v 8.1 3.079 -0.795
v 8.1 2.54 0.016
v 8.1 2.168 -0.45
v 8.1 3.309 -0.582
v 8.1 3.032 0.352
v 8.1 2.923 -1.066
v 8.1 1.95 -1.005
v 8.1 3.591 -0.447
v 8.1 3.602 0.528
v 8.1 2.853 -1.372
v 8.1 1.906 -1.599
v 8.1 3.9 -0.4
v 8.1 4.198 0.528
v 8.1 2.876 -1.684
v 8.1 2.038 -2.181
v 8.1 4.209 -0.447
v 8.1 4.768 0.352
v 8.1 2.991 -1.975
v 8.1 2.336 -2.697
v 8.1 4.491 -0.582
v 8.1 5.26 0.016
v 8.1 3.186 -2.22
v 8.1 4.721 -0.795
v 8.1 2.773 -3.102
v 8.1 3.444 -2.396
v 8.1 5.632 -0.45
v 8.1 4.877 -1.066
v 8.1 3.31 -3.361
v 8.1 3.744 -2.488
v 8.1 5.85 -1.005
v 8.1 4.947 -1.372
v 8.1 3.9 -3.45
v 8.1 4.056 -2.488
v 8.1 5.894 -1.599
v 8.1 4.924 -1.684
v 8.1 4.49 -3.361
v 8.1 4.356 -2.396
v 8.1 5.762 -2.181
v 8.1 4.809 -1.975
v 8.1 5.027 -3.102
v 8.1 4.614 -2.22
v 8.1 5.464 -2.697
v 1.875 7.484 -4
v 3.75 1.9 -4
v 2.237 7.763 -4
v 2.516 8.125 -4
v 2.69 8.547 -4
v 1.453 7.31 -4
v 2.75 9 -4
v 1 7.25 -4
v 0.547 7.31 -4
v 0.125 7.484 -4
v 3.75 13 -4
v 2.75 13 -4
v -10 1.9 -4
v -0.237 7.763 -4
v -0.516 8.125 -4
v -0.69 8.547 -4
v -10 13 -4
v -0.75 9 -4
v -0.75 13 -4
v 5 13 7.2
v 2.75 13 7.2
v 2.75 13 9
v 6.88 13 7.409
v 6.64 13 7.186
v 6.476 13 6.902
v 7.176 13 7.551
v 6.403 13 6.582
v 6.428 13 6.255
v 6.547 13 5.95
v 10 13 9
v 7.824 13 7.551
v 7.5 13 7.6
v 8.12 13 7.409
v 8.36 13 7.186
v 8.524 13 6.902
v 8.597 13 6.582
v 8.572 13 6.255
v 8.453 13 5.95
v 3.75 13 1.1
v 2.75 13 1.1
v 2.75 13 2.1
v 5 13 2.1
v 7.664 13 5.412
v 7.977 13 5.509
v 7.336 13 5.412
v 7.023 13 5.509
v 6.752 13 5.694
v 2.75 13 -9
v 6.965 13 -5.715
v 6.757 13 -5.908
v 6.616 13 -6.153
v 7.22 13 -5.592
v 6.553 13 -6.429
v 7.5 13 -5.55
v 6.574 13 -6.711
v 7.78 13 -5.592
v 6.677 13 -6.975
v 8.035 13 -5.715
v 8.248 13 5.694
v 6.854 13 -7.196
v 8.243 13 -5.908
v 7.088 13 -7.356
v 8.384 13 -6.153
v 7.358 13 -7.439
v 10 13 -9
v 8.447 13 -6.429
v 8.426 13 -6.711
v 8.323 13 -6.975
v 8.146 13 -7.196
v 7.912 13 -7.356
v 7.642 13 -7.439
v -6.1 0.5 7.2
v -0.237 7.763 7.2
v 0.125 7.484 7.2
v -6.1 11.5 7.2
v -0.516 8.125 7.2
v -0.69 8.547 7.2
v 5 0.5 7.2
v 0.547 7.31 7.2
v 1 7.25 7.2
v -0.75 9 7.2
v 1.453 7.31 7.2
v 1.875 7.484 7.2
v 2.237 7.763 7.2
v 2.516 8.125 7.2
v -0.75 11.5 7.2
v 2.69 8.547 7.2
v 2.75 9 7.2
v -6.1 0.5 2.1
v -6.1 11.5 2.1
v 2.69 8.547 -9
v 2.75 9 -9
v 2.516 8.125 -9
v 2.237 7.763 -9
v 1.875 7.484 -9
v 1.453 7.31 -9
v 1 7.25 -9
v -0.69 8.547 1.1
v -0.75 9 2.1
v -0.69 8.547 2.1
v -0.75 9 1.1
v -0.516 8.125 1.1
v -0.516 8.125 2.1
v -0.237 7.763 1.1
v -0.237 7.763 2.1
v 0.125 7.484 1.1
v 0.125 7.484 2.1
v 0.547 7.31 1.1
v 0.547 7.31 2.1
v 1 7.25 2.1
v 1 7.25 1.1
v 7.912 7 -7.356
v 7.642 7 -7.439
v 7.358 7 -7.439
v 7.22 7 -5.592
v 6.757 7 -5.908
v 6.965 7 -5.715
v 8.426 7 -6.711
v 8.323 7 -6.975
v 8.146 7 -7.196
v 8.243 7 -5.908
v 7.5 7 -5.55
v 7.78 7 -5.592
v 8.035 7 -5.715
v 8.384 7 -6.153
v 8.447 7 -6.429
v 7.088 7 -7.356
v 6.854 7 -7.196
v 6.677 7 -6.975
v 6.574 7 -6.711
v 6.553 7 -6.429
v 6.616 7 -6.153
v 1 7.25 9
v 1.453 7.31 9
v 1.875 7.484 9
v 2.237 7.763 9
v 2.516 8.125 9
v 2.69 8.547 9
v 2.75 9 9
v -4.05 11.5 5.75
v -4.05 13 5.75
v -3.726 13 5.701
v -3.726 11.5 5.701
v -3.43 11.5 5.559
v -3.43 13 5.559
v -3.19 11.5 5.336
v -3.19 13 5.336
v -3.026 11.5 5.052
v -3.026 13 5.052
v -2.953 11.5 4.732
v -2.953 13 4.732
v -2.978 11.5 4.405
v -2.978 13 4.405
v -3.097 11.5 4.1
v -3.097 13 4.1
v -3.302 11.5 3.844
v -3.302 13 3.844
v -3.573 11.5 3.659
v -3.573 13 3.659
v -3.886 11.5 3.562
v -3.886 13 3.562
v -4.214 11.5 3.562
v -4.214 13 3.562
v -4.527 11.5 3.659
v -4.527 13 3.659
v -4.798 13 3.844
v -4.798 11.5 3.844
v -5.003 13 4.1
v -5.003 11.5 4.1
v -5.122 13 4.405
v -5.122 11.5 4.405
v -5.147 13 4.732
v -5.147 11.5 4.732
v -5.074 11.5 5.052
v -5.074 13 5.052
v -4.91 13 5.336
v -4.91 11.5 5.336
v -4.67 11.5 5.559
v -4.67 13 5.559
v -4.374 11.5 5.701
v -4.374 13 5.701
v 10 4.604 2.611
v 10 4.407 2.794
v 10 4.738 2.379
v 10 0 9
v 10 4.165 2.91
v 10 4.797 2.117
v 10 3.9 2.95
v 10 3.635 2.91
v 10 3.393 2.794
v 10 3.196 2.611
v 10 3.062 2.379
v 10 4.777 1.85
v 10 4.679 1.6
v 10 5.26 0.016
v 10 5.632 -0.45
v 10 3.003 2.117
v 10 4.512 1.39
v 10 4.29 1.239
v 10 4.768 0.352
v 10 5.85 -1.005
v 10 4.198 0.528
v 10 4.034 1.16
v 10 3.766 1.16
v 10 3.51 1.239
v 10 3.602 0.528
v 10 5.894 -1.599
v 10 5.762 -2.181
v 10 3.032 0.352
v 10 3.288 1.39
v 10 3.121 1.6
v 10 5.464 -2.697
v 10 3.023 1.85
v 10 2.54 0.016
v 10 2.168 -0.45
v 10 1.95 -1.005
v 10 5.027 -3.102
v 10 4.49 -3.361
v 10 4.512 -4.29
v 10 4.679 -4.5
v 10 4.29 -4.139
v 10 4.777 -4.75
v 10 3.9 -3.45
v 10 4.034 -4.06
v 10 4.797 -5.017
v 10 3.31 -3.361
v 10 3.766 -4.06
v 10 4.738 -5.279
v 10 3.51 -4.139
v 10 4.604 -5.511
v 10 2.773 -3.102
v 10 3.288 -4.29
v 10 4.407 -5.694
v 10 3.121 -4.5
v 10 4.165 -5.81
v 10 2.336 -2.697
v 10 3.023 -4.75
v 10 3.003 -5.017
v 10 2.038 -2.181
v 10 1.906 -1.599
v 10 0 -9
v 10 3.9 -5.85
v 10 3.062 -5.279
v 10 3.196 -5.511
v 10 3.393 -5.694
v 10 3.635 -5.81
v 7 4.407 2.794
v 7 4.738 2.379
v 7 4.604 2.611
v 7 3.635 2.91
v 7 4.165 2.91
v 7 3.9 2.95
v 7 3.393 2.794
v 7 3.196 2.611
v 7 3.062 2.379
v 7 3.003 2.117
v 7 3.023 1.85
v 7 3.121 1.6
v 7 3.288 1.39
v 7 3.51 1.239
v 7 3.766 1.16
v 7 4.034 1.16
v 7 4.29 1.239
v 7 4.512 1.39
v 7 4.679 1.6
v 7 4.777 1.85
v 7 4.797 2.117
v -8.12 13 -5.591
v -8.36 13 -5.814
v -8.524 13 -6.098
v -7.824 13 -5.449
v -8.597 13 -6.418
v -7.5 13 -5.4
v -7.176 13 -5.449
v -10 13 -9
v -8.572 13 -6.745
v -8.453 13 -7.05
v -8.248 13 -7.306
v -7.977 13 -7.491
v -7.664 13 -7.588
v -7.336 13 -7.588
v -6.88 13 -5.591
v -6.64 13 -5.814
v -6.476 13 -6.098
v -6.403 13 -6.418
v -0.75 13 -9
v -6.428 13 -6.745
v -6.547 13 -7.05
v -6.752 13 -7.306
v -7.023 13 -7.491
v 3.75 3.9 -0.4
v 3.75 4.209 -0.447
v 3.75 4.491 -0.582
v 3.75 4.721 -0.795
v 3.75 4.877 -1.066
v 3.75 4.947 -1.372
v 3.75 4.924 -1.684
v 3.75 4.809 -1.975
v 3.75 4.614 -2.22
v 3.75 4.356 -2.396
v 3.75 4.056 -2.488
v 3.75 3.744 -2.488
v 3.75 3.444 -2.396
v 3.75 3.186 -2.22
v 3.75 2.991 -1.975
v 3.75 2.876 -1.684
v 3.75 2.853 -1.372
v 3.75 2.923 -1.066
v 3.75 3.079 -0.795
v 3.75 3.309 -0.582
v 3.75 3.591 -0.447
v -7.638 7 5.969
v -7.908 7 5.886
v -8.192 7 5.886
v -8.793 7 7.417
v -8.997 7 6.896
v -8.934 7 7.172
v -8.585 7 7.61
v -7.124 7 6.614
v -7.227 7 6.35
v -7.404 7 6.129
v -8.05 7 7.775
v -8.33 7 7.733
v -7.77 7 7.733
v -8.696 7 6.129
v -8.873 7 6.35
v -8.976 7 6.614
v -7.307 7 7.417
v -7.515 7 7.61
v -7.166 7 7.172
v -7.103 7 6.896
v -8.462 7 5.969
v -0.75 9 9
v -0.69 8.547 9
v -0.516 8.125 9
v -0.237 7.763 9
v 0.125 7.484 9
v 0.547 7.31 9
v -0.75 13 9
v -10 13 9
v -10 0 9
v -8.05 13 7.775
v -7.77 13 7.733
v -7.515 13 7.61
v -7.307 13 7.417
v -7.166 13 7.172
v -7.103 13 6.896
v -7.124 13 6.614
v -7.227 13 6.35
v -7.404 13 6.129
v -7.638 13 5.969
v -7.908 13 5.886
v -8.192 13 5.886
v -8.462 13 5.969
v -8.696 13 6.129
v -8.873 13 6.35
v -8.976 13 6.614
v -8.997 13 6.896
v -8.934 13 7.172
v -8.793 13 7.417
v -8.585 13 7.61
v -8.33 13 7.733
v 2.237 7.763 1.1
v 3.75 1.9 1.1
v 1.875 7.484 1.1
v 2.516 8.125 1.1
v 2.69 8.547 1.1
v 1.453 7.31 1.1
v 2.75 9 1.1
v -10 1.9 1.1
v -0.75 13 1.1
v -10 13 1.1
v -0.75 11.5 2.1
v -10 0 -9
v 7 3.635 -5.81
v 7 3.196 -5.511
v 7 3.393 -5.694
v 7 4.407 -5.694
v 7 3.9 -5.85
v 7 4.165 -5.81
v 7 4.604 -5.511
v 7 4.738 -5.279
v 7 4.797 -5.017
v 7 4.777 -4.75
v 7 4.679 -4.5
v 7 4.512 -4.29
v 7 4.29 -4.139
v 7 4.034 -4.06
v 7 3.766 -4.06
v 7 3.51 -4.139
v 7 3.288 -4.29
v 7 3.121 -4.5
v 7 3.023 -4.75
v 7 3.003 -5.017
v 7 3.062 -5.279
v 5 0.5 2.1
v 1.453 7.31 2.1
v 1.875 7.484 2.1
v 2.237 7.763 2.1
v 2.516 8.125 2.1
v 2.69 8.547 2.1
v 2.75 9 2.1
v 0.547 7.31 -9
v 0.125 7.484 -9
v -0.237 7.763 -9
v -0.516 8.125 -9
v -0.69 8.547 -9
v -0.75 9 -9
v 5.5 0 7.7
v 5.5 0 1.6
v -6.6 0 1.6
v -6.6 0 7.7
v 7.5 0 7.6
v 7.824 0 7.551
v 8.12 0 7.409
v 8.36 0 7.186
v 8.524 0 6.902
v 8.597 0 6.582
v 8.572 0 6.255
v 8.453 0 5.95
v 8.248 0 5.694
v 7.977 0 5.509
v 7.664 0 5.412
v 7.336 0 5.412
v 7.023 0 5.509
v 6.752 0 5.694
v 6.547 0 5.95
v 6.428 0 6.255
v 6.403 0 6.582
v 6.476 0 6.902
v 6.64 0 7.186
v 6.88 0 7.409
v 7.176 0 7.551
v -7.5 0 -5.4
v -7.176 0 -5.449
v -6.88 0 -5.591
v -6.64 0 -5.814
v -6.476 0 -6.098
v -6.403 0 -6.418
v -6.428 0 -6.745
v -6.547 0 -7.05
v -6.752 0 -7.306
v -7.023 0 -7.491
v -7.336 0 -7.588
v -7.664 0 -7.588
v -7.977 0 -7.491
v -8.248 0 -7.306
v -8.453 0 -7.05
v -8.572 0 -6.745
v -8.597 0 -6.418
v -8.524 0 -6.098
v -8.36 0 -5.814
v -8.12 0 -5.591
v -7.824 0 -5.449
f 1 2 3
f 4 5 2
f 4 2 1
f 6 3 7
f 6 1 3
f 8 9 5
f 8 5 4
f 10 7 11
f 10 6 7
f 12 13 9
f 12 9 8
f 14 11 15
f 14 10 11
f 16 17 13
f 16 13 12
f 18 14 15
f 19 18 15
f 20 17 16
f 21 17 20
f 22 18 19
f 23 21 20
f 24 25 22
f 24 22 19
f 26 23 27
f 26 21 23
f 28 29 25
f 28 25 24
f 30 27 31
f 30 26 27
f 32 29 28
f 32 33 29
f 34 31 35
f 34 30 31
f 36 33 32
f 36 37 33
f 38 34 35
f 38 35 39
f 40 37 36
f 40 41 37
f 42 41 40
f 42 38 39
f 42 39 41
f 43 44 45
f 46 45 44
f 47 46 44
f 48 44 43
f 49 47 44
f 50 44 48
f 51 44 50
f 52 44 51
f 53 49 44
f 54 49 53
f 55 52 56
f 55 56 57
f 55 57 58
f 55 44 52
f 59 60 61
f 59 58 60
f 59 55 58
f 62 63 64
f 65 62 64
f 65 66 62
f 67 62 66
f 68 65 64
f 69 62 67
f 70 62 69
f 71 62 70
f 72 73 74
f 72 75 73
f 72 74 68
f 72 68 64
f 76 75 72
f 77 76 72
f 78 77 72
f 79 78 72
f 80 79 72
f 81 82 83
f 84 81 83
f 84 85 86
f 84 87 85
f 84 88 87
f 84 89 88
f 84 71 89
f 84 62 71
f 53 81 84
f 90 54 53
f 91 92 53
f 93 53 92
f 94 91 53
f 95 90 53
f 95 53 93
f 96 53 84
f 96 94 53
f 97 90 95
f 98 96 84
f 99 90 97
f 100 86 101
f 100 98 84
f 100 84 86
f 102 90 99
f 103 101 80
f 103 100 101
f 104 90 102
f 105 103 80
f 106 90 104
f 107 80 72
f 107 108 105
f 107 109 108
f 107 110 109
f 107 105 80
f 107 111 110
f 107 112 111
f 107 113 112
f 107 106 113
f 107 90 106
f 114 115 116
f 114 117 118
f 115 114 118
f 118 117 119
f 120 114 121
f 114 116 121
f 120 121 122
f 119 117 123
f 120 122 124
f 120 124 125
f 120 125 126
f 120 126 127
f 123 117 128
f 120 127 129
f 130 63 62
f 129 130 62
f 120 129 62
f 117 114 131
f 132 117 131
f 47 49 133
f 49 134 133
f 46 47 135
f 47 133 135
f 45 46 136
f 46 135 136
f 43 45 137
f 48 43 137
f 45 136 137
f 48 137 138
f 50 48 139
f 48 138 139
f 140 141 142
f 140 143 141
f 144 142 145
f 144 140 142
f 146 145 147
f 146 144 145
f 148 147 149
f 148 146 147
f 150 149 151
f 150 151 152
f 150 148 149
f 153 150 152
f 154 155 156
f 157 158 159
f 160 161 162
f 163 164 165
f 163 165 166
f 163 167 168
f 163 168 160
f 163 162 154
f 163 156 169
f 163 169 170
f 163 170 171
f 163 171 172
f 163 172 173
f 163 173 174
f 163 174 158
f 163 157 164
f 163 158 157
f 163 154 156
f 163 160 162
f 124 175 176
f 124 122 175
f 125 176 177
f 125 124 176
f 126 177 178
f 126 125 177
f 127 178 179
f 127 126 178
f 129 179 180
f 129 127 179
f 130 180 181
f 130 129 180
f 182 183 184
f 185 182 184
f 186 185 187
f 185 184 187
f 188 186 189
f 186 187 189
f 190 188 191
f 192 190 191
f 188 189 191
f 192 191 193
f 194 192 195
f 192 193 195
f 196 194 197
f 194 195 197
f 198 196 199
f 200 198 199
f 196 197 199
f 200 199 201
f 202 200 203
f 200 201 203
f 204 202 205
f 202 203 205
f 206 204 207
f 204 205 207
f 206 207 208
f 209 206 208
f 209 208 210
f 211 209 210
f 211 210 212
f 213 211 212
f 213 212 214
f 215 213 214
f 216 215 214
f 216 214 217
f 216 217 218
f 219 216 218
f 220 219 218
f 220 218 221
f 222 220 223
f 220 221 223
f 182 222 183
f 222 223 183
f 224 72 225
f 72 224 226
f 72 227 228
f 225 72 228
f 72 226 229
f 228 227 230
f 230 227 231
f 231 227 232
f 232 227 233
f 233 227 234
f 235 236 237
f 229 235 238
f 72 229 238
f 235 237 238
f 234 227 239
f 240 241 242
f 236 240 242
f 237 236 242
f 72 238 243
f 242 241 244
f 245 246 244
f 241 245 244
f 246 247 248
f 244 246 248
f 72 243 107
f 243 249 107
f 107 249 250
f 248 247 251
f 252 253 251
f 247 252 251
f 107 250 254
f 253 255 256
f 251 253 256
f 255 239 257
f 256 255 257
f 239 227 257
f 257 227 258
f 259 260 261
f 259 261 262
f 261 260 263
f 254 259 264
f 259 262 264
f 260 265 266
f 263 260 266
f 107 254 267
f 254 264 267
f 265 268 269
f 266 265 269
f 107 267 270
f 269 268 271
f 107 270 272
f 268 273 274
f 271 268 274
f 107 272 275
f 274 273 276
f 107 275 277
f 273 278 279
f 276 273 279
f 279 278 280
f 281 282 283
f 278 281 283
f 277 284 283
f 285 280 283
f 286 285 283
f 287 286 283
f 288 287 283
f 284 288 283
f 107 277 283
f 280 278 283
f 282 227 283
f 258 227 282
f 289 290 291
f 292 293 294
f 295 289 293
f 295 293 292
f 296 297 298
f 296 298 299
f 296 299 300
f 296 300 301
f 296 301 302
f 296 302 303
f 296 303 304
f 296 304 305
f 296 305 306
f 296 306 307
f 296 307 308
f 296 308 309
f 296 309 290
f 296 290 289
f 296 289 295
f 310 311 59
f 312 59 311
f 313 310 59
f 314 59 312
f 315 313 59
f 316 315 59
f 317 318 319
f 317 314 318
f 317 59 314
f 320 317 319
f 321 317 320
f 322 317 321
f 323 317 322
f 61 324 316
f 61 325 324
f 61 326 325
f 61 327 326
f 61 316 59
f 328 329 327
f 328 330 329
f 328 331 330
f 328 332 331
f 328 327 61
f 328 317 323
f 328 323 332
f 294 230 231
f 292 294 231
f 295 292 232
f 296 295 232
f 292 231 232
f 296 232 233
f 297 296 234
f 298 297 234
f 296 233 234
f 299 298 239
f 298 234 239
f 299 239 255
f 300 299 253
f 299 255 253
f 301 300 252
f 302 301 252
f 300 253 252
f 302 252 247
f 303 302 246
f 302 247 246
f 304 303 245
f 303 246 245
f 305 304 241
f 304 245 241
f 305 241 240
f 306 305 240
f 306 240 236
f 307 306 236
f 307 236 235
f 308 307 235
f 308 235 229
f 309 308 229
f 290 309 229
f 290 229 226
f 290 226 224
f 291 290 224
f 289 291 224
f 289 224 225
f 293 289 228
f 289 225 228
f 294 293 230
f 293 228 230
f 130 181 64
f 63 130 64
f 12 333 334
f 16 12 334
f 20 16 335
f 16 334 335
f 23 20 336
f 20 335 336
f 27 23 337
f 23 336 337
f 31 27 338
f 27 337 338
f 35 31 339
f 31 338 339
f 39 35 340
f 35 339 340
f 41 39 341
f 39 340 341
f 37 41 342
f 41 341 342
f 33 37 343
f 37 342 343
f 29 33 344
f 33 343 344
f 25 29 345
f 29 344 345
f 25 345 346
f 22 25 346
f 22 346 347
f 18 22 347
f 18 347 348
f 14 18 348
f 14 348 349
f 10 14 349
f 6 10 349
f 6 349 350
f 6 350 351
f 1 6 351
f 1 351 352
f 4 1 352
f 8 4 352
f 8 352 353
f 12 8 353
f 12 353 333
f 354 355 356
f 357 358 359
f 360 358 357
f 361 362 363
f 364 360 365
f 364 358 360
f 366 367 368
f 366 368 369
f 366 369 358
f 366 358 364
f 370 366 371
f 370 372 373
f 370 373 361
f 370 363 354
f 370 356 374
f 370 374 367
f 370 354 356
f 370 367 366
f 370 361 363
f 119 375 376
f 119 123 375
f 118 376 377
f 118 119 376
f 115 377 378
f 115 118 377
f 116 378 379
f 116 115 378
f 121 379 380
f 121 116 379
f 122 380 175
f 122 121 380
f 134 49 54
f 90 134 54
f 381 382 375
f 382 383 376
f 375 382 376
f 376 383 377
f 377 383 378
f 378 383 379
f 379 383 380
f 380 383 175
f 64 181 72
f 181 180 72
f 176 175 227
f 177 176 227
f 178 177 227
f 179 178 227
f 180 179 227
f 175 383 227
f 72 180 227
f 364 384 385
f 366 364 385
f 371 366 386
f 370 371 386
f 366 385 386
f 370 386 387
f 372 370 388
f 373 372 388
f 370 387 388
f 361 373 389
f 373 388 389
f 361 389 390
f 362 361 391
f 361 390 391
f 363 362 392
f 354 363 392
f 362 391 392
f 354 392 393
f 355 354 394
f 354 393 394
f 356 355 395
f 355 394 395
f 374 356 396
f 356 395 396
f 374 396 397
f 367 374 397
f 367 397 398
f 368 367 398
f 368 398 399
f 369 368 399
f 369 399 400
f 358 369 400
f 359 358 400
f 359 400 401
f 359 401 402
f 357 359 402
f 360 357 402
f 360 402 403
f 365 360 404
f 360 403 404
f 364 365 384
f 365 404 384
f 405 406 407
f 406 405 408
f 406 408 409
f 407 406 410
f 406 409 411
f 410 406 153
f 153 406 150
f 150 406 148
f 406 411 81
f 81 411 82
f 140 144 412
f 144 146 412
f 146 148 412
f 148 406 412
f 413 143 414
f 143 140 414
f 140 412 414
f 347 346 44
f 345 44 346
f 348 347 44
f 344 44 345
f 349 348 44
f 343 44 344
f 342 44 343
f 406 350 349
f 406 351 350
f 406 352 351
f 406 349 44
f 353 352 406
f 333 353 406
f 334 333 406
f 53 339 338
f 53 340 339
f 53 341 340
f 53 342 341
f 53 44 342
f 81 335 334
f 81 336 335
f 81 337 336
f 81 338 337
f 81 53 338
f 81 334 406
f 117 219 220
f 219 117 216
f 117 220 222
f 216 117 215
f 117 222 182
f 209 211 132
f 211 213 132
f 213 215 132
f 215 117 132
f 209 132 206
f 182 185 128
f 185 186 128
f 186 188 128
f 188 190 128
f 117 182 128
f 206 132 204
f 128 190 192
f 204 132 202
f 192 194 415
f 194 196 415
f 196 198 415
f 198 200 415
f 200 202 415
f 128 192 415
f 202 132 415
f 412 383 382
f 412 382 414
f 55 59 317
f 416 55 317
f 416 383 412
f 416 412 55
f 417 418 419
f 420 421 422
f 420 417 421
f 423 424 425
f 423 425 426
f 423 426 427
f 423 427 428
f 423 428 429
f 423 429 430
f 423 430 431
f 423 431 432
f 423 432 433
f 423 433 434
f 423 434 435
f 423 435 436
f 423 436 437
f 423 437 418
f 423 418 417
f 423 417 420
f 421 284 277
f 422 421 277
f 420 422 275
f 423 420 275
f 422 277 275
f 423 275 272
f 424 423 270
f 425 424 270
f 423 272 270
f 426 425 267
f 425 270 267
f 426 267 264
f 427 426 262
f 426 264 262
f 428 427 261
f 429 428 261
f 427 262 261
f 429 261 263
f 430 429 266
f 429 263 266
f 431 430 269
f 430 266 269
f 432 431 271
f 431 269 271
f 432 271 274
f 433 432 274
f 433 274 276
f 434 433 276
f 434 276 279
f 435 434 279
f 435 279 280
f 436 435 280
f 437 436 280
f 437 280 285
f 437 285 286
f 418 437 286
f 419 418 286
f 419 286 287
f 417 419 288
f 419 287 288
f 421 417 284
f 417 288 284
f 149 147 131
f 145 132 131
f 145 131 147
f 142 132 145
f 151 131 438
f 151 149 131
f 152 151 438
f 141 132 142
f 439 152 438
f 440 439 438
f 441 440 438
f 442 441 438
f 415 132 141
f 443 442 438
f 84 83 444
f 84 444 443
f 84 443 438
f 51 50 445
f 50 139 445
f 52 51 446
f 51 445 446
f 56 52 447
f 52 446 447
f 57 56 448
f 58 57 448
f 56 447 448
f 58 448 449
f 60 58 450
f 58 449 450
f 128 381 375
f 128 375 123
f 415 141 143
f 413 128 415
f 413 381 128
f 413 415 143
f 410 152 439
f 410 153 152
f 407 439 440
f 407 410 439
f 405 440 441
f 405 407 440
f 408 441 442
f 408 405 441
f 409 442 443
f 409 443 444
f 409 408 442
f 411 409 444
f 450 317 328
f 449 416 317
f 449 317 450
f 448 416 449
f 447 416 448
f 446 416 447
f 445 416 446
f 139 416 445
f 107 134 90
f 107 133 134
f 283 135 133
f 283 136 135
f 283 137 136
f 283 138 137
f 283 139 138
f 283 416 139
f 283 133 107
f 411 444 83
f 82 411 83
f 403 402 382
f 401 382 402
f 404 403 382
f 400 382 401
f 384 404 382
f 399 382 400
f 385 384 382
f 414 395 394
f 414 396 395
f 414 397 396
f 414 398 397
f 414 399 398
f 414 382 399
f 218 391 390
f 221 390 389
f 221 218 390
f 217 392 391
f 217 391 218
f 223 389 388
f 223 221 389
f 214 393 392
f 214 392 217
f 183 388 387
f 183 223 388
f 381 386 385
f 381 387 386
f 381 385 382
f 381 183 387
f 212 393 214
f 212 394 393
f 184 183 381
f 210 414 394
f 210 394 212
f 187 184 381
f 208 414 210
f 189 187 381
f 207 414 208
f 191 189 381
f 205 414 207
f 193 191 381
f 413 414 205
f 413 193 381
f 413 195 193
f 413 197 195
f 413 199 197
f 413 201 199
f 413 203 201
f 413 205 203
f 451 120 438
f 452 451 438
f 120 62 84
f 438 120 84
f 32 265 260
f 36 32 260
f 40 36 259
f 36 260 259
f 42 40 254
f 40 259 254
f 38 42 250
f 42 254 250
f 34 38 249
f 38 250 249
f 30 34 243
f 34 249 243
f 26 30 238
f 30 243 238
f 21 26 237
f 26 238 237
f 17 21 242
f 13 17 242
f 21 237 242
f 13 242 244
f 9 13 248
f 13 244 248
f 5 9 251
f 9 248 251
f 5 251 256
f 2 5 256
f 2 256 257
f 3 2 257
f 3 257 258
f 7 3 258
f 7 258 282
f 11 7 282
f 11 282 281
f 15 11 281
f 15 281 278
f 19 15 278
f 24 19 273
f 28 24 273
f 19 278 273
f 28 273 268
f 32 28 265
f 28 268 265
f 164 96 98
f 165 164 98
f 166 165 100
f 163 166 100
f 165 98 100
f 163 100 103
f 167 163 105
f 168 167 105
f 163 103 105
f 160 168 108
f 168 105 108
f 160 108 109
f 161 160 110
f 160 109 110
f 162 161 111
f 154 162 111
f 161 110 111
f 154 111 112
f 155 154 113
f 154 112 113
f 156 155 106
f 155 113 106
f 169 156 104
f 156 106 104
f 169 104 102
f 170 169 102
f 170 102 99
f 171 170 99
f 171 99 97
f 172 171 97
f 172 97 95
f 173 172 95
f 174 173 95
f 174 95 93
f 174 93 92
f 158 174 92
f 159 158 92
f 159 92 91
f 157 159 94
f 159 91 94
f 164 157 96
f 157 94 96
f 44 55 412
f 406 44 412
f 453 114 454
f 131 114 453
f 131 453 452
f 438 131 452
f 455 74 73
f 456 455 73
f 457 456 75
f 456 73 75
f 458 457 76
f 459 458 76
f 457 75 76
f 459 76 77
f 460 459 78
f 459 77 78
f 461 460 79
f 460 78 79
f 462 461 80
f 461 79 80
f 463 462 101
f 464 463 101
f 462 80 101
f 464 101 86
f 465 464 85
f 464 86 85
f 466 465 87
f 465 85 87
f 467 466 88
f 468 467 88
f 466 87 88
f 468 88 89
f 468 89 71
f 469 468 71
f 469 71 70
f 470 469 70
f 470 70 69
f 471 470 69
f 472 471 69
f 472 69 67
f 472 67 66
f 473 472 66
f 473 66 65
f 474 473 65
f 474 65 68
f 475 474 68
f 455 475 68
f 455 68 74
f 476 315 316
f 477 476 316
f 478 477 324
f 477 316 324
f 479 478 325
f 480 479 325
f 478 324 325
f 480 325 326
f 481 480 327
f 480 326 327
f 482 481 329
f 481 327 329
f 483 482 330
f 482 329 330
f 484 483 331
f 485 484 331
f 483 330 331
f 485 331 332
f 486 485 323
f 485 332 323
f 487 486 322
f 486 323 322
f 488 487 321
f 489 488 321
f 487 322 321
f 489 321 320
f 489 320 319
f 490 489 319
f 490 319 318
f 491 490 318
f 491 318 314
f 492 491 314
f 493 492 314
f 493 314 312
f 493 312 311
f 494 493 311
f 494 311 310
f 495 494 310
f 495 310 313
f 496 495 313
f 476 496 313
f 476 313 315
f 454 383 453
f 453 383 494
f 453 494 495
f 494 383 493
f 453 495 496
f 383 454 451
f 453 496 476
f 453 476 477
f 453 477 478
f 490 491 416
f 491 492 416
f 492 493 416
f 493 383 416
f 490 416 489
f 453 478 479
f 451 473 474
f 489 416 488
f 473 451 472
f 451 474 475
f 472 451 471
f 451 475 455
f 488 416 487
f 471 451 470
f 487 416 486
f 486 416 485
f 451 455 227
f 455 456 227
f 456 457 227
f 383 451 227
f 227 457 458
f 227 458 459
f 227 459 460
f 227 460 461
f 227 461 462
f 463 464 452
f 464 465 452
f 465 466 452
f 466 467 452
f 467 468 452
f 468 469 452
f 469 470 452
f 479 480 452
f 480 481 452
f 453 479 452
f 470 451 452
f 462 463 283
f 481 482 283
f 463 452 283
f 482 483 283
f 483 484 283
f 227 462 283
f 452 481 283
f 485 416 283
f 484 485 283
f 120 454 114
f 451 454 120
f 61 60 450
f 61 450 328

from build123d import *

# Parameters (mm, degrees)
SKETCH1_W           = 20
SKETCH1_H           = 18
BOSS_EXTRUDE1_DEPTH = 13
SKETCH7_W           = 3.5
SKETCH7_H           = 5.75
CUT_EXTRUDE6_DEPTH  = 25.351591324
SKETCH2_W           = 5.1
SKETCH2_H           = 11.1
CUT_EXTRUDE1_DEPTH  = 13.75
SKETCH3_R           = 1.05
CUT_EXTRUDE2_DEPTH  = 21.953818268
SKETCH4_R           = 2
CUT_EXTRUDE3_DEPTH  = 1.9
SKETCH11_R          = 0.9
CUT_EXTRUDE9_DEPTH  = 3
SKETCH5_W           = 11.1
SKETCH5_H           = 5.1
CUT_EXTRUDE4_DEPTH  = 19.708286934
SKETCH8_W           = 5.35
SKETCH8_H           = 5.1
SKETCH8_R           = 1.1
BOSS_EXTRUDE2_DEPTH = 1.5
SKETCH10_R          = 0.95
CUT_EXTRUDE8_DEPTH  = 6
SKETCH14_R          = 1.1
CUT_EXTRUDE11_DEPTH = 19.708286934
FILLET2_R           = 1.75
CHAMFER1_SIZE       = 0.5


with BuildPart() as part:
    # Sketch1 → Boss-Extrude1 (new body)
    with BuildSketch(Plane(origin=(0, 0, 0), x_dir=(1, 0, 0), z_dir=(0, 1, 0))):
        Rectangle(SKETCH1_W, SKETCH1_H)
    extrude(amount=BOSS_EXTRUDE1_DEPTH)

    # Sketch7 → Cut-Extrude6 (cut, through all)
    with BuildSketch(Plane.XY.offset(9)):
        with Locations((1, 10.125)):
            Rectangle(SKETCH7_W, SKETCH7_H)
    extrude(amount=-CUT_EXTRUDE6_DEPTH, mode=Mode.SUBTRACT)

    # Sketch2 → Cut-Extrude1 (cut)
    with BuildSketch(Plane.ZY.offset(10)):
        with Locations((-1.45, 7.45)):
            Rectangle(SKETCH2_W, SKETCH2_H)
    extrude(amount=-CUT_EXTRUDE1_DEPTH, mode=Mode.SUBTRACT)

    # Sketch3 → Cut-Extrude2 (cut, through all)
    with BuildSketch(Plane.ZY.offset(-3.75)):
        with Locations((-1.45, 3.9)):
            Circle(SKETCH3_R)
    extrude(amount=-CUT_EXTRUDE2_DEPTH, mode=Mode.SUBTRACT)

    # Sketch4 → Cut-Extrude3 (cut)
    with BuildSketch(Plane(origin=(10, 0, 0), x_dir=(0, 0, -1), z_dir=(1, 0, 0))):
        with Locations((1.45, 3.9)):
            Circle(SKETCH4_R)
    extrude(amount=-CUT_EXTRUDE3_DEPTH, mode=Mode.SUBTRACT)

    # Sketch11 → Cut-Extrude9 (cut)
    with BuildSketch(Plane(origin=(10, 0, 0), x_dir=(0, 0, -1), z_dir=(1, 0, 0))):
        with Locations((4.95, 3.9)):
            Circle(SKETCH11_R)
        with Locations(Location((-2.05, 3.9, 0), (0, 0, 180))):
            Circle(SKETCH11_R)
    extrude(amount=-CUT_EXTRUDE9_DEPTH, mode=Mode.SUBTRACT)

    # Sketch5 → Cut-Extrude4 (cut, through all)
    with BuildSketch(Plane(origin=(0, 13, 0), x_dir=(1, 0, 0), z_dir=(0, 1, 0))):
        with Locations((-0.55, -4.65)):
            Rectangle(SKETCH5_W, SKETCH5_H)
    extrude(amount=-CUT_EXTRUDE4_DEPTH, mode=Mode.SUBTRACT)

    # Sketch8 → Boss-Extrude2 (add)
    with BuildSketch(Plane(origin=(0, 13, 0), x_dir=(1, 0, 0), z_dir=(0, 1, 0))):
        with Locations((-3.425, -4.65)):
            Rectangle(SKETCH8_W, SKETCH8_H)
        with Locations(Location((-4.05, -4.65, 0), (0, 0, 270))):
            Circle(SKETCH8_R, mode=Mode.SUBTRACT)
    extrude(amount=-BOSS_EXTRUDE2_DEPTH)

    # Sketch10 → Cut-Extrude8 (cut)
    with BuildSketch(Plane(origin=(0, 13, 0), x_dir=(1, 0, 0), z_dir=(0, 1, 0))):
        with Locations(Location((-8.05, -6.825, 0), (0, 0, 270))):
            Circle(SKETCH10_R)
        with Locations(Location((7.5, 6.5, 0), (0, 0, 270))):
            Circle(SKETCH10_R)
    extrude(amount=-CUT_EXTRUDE8_DEPTH, mode=Mode.SUBTRACT)

    # Sketch14 → Cut-Extrude11 (cut, through all)
    with BuildSketch(Plane(origin=(0, 13, 0), x_dir=(1, 0, 0), z_dir=(0, 1, 0))):
        with Locations(Location((-7.5, 6.5, 0), (0, 0, 270))):
            Circle(SKETCH14_R)
        with Locations(Location((7.5, -6.5, 0), (0, 0, 270))):
            Circle(SKETCH14_R)
    extrude(amount=-CUT_EXTRUDE11_DEPTH, mode=Mode.SUBTRACT)

    # Fillet2
    fillet2_edges = [part.edges().sort_by_distance(p)[0] for p in [
        (2.75, 7.25, 8.1),
        (2.75, 7.25, 1.6),
        (-0.75, 7.25, 8.1),
        (-0.75, 7.25, 1.6),
        (2.75, 7.25, -6.5),
        (-0.75, 7.25, -6.5),
    ]]
    fillet(fillet2_edges, radius=FILLET2_R - 0.0001)  # a hair under: the kernel refuses the full size

    # Chamfer1
    chamfer1_edges = [part.edges().sort_by_distance(p)[0] for p in [
        (-0.55, 0, 2.1),
        (-0.55, 0, 7.2),
        (-6.1, 0, 4.65),
        (5, 0, 4.65),
    ]]
    chamfer(chamfer1_edges, length=CHAMFER1_SIZE)


solid = part.part
